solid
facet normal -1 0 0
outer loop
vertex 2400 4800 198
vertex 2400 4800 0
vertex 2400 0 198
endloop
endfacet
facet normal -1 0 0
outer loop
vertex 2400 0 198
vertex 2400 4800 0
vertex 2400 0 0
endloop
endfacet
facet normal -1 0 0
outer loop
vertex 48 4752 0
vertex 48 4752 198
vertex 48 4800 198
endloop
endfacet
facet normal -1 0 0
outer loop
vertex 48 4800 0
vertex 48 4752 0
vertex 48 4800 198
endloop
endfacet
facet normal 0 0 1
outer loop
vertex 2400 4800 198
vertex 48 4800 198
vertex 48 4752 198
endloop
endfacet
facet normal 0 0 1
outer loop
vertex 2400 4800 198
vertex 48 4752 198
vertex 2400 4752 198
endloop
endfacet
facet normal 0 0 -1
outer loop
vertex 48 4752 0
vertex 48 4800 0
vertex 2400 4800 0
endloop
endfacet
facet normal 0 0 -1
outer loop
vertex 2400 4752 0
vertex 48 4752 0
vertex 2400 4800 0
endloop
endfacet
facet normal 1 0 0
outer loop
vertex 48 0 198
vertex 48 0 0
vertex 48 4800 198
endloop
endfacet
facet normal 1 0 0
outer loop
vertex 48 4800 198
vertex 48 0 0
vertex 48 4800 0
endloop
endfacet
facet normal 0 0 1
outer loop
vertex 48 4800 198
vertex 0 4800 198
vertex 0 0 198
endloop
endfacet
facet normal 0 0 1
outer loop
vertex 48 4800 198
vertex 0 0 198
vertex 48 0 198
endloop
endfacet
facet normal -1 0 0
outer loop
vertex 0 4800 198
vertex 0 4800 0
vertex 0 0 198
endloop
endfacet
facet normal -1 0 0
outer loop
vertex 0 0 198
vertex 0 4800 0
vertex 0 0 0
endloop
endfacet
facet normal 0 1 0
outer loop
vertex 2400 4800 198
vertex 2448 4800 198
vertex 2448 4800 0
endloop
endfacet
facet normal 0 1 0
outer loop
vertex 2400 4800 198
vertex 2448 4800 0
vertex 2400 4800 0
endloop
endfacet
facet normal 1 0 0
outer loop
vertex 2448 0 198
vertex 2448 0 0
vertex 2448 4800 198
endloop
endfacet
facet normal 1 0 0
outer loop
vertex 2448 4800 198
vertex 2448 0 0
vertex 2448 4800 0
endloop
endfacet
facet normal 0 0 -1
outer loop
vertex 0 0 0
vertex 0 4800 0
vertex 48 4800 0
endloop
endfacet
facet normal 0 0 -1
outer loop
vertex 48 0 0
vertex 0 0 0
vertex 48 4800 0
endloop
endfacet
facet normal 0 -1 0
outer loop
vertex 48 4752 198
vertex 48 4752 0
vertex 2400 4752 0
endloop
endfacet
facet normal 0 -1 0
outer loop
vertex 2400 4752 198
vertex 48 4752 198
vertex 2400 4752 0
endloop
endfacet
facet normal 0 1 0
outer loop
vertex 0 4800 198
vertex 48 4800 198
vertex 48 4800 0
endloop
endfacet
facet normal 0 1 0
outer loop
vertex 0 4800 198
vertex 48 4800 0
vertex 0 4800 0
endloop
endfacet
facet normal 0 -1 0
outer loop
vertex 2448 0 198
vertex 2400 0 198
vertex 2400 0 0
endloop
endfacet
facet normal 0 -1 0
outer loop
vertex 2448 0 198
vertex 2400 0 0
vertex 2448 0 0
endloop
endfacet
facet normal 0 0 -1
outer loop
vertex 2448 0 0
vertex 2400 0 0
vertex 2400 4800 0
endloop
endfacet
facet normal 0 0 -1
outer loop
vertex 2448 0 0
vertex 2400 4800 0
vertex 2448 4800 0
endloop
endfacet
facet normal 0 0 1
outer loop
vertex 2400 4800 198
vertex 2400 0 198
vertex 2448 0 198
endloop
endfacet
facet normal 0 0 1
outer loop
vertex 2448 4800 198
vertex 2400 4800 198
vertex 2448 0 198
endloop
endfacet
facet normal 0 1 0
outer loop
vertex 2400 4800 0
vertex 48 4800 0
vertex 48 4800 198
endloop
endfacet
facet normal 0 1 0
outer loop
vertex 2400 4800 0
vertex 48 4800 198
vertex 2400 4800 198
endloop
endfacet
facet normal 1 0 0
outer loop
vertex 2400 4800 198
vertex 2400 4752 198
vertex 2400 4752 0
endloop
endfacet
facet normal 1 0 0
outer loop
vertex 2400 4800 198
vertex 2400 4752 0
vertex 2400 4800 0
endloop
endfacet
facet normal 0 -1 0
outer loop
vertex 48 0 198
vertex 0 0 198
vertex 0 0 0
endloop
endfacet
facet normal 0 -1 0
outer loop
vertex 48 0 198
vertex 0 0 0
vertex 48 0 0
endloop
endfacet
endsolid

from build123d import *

# Parameters (mm, degrees)
F1_DEPTH = 198
F0_W     = 2352
F0_H     = 48
F2_DEPTH = 198
F3_DEPTH = 198


with BuildPart() as f1:
    # F0 (on Top) → F1 (new body)
    with BuildSketch(Plane.XY):
        Polygon((0, 4800), (0, 0), (48, 0), (48, 4752), (48, 4800), align=None)
    extrude(amount=F1_DEPTH)


with BuildPart() as f2:
    # F0 (on Top) → F2 (new body)
    with BuildSketch(Plane.XY):
        with Locations((1224, 4776)):
            Rectangle(F0_W, F0_H)
    extrude(amount=F2_DEPTH)


with BuildPart() as f3:
    # F0 (on Top) → F3 (new body)
    with BuildSketch(Plane.XY):
        Polygon((2400, 4800), (2400, 4752), (2400, 0), (2448, 0), (2448, 4800), align=None)
    extrude(amount=F3_DEPTH)


solid = Compound([f1.part, f2.part, f3.part])
